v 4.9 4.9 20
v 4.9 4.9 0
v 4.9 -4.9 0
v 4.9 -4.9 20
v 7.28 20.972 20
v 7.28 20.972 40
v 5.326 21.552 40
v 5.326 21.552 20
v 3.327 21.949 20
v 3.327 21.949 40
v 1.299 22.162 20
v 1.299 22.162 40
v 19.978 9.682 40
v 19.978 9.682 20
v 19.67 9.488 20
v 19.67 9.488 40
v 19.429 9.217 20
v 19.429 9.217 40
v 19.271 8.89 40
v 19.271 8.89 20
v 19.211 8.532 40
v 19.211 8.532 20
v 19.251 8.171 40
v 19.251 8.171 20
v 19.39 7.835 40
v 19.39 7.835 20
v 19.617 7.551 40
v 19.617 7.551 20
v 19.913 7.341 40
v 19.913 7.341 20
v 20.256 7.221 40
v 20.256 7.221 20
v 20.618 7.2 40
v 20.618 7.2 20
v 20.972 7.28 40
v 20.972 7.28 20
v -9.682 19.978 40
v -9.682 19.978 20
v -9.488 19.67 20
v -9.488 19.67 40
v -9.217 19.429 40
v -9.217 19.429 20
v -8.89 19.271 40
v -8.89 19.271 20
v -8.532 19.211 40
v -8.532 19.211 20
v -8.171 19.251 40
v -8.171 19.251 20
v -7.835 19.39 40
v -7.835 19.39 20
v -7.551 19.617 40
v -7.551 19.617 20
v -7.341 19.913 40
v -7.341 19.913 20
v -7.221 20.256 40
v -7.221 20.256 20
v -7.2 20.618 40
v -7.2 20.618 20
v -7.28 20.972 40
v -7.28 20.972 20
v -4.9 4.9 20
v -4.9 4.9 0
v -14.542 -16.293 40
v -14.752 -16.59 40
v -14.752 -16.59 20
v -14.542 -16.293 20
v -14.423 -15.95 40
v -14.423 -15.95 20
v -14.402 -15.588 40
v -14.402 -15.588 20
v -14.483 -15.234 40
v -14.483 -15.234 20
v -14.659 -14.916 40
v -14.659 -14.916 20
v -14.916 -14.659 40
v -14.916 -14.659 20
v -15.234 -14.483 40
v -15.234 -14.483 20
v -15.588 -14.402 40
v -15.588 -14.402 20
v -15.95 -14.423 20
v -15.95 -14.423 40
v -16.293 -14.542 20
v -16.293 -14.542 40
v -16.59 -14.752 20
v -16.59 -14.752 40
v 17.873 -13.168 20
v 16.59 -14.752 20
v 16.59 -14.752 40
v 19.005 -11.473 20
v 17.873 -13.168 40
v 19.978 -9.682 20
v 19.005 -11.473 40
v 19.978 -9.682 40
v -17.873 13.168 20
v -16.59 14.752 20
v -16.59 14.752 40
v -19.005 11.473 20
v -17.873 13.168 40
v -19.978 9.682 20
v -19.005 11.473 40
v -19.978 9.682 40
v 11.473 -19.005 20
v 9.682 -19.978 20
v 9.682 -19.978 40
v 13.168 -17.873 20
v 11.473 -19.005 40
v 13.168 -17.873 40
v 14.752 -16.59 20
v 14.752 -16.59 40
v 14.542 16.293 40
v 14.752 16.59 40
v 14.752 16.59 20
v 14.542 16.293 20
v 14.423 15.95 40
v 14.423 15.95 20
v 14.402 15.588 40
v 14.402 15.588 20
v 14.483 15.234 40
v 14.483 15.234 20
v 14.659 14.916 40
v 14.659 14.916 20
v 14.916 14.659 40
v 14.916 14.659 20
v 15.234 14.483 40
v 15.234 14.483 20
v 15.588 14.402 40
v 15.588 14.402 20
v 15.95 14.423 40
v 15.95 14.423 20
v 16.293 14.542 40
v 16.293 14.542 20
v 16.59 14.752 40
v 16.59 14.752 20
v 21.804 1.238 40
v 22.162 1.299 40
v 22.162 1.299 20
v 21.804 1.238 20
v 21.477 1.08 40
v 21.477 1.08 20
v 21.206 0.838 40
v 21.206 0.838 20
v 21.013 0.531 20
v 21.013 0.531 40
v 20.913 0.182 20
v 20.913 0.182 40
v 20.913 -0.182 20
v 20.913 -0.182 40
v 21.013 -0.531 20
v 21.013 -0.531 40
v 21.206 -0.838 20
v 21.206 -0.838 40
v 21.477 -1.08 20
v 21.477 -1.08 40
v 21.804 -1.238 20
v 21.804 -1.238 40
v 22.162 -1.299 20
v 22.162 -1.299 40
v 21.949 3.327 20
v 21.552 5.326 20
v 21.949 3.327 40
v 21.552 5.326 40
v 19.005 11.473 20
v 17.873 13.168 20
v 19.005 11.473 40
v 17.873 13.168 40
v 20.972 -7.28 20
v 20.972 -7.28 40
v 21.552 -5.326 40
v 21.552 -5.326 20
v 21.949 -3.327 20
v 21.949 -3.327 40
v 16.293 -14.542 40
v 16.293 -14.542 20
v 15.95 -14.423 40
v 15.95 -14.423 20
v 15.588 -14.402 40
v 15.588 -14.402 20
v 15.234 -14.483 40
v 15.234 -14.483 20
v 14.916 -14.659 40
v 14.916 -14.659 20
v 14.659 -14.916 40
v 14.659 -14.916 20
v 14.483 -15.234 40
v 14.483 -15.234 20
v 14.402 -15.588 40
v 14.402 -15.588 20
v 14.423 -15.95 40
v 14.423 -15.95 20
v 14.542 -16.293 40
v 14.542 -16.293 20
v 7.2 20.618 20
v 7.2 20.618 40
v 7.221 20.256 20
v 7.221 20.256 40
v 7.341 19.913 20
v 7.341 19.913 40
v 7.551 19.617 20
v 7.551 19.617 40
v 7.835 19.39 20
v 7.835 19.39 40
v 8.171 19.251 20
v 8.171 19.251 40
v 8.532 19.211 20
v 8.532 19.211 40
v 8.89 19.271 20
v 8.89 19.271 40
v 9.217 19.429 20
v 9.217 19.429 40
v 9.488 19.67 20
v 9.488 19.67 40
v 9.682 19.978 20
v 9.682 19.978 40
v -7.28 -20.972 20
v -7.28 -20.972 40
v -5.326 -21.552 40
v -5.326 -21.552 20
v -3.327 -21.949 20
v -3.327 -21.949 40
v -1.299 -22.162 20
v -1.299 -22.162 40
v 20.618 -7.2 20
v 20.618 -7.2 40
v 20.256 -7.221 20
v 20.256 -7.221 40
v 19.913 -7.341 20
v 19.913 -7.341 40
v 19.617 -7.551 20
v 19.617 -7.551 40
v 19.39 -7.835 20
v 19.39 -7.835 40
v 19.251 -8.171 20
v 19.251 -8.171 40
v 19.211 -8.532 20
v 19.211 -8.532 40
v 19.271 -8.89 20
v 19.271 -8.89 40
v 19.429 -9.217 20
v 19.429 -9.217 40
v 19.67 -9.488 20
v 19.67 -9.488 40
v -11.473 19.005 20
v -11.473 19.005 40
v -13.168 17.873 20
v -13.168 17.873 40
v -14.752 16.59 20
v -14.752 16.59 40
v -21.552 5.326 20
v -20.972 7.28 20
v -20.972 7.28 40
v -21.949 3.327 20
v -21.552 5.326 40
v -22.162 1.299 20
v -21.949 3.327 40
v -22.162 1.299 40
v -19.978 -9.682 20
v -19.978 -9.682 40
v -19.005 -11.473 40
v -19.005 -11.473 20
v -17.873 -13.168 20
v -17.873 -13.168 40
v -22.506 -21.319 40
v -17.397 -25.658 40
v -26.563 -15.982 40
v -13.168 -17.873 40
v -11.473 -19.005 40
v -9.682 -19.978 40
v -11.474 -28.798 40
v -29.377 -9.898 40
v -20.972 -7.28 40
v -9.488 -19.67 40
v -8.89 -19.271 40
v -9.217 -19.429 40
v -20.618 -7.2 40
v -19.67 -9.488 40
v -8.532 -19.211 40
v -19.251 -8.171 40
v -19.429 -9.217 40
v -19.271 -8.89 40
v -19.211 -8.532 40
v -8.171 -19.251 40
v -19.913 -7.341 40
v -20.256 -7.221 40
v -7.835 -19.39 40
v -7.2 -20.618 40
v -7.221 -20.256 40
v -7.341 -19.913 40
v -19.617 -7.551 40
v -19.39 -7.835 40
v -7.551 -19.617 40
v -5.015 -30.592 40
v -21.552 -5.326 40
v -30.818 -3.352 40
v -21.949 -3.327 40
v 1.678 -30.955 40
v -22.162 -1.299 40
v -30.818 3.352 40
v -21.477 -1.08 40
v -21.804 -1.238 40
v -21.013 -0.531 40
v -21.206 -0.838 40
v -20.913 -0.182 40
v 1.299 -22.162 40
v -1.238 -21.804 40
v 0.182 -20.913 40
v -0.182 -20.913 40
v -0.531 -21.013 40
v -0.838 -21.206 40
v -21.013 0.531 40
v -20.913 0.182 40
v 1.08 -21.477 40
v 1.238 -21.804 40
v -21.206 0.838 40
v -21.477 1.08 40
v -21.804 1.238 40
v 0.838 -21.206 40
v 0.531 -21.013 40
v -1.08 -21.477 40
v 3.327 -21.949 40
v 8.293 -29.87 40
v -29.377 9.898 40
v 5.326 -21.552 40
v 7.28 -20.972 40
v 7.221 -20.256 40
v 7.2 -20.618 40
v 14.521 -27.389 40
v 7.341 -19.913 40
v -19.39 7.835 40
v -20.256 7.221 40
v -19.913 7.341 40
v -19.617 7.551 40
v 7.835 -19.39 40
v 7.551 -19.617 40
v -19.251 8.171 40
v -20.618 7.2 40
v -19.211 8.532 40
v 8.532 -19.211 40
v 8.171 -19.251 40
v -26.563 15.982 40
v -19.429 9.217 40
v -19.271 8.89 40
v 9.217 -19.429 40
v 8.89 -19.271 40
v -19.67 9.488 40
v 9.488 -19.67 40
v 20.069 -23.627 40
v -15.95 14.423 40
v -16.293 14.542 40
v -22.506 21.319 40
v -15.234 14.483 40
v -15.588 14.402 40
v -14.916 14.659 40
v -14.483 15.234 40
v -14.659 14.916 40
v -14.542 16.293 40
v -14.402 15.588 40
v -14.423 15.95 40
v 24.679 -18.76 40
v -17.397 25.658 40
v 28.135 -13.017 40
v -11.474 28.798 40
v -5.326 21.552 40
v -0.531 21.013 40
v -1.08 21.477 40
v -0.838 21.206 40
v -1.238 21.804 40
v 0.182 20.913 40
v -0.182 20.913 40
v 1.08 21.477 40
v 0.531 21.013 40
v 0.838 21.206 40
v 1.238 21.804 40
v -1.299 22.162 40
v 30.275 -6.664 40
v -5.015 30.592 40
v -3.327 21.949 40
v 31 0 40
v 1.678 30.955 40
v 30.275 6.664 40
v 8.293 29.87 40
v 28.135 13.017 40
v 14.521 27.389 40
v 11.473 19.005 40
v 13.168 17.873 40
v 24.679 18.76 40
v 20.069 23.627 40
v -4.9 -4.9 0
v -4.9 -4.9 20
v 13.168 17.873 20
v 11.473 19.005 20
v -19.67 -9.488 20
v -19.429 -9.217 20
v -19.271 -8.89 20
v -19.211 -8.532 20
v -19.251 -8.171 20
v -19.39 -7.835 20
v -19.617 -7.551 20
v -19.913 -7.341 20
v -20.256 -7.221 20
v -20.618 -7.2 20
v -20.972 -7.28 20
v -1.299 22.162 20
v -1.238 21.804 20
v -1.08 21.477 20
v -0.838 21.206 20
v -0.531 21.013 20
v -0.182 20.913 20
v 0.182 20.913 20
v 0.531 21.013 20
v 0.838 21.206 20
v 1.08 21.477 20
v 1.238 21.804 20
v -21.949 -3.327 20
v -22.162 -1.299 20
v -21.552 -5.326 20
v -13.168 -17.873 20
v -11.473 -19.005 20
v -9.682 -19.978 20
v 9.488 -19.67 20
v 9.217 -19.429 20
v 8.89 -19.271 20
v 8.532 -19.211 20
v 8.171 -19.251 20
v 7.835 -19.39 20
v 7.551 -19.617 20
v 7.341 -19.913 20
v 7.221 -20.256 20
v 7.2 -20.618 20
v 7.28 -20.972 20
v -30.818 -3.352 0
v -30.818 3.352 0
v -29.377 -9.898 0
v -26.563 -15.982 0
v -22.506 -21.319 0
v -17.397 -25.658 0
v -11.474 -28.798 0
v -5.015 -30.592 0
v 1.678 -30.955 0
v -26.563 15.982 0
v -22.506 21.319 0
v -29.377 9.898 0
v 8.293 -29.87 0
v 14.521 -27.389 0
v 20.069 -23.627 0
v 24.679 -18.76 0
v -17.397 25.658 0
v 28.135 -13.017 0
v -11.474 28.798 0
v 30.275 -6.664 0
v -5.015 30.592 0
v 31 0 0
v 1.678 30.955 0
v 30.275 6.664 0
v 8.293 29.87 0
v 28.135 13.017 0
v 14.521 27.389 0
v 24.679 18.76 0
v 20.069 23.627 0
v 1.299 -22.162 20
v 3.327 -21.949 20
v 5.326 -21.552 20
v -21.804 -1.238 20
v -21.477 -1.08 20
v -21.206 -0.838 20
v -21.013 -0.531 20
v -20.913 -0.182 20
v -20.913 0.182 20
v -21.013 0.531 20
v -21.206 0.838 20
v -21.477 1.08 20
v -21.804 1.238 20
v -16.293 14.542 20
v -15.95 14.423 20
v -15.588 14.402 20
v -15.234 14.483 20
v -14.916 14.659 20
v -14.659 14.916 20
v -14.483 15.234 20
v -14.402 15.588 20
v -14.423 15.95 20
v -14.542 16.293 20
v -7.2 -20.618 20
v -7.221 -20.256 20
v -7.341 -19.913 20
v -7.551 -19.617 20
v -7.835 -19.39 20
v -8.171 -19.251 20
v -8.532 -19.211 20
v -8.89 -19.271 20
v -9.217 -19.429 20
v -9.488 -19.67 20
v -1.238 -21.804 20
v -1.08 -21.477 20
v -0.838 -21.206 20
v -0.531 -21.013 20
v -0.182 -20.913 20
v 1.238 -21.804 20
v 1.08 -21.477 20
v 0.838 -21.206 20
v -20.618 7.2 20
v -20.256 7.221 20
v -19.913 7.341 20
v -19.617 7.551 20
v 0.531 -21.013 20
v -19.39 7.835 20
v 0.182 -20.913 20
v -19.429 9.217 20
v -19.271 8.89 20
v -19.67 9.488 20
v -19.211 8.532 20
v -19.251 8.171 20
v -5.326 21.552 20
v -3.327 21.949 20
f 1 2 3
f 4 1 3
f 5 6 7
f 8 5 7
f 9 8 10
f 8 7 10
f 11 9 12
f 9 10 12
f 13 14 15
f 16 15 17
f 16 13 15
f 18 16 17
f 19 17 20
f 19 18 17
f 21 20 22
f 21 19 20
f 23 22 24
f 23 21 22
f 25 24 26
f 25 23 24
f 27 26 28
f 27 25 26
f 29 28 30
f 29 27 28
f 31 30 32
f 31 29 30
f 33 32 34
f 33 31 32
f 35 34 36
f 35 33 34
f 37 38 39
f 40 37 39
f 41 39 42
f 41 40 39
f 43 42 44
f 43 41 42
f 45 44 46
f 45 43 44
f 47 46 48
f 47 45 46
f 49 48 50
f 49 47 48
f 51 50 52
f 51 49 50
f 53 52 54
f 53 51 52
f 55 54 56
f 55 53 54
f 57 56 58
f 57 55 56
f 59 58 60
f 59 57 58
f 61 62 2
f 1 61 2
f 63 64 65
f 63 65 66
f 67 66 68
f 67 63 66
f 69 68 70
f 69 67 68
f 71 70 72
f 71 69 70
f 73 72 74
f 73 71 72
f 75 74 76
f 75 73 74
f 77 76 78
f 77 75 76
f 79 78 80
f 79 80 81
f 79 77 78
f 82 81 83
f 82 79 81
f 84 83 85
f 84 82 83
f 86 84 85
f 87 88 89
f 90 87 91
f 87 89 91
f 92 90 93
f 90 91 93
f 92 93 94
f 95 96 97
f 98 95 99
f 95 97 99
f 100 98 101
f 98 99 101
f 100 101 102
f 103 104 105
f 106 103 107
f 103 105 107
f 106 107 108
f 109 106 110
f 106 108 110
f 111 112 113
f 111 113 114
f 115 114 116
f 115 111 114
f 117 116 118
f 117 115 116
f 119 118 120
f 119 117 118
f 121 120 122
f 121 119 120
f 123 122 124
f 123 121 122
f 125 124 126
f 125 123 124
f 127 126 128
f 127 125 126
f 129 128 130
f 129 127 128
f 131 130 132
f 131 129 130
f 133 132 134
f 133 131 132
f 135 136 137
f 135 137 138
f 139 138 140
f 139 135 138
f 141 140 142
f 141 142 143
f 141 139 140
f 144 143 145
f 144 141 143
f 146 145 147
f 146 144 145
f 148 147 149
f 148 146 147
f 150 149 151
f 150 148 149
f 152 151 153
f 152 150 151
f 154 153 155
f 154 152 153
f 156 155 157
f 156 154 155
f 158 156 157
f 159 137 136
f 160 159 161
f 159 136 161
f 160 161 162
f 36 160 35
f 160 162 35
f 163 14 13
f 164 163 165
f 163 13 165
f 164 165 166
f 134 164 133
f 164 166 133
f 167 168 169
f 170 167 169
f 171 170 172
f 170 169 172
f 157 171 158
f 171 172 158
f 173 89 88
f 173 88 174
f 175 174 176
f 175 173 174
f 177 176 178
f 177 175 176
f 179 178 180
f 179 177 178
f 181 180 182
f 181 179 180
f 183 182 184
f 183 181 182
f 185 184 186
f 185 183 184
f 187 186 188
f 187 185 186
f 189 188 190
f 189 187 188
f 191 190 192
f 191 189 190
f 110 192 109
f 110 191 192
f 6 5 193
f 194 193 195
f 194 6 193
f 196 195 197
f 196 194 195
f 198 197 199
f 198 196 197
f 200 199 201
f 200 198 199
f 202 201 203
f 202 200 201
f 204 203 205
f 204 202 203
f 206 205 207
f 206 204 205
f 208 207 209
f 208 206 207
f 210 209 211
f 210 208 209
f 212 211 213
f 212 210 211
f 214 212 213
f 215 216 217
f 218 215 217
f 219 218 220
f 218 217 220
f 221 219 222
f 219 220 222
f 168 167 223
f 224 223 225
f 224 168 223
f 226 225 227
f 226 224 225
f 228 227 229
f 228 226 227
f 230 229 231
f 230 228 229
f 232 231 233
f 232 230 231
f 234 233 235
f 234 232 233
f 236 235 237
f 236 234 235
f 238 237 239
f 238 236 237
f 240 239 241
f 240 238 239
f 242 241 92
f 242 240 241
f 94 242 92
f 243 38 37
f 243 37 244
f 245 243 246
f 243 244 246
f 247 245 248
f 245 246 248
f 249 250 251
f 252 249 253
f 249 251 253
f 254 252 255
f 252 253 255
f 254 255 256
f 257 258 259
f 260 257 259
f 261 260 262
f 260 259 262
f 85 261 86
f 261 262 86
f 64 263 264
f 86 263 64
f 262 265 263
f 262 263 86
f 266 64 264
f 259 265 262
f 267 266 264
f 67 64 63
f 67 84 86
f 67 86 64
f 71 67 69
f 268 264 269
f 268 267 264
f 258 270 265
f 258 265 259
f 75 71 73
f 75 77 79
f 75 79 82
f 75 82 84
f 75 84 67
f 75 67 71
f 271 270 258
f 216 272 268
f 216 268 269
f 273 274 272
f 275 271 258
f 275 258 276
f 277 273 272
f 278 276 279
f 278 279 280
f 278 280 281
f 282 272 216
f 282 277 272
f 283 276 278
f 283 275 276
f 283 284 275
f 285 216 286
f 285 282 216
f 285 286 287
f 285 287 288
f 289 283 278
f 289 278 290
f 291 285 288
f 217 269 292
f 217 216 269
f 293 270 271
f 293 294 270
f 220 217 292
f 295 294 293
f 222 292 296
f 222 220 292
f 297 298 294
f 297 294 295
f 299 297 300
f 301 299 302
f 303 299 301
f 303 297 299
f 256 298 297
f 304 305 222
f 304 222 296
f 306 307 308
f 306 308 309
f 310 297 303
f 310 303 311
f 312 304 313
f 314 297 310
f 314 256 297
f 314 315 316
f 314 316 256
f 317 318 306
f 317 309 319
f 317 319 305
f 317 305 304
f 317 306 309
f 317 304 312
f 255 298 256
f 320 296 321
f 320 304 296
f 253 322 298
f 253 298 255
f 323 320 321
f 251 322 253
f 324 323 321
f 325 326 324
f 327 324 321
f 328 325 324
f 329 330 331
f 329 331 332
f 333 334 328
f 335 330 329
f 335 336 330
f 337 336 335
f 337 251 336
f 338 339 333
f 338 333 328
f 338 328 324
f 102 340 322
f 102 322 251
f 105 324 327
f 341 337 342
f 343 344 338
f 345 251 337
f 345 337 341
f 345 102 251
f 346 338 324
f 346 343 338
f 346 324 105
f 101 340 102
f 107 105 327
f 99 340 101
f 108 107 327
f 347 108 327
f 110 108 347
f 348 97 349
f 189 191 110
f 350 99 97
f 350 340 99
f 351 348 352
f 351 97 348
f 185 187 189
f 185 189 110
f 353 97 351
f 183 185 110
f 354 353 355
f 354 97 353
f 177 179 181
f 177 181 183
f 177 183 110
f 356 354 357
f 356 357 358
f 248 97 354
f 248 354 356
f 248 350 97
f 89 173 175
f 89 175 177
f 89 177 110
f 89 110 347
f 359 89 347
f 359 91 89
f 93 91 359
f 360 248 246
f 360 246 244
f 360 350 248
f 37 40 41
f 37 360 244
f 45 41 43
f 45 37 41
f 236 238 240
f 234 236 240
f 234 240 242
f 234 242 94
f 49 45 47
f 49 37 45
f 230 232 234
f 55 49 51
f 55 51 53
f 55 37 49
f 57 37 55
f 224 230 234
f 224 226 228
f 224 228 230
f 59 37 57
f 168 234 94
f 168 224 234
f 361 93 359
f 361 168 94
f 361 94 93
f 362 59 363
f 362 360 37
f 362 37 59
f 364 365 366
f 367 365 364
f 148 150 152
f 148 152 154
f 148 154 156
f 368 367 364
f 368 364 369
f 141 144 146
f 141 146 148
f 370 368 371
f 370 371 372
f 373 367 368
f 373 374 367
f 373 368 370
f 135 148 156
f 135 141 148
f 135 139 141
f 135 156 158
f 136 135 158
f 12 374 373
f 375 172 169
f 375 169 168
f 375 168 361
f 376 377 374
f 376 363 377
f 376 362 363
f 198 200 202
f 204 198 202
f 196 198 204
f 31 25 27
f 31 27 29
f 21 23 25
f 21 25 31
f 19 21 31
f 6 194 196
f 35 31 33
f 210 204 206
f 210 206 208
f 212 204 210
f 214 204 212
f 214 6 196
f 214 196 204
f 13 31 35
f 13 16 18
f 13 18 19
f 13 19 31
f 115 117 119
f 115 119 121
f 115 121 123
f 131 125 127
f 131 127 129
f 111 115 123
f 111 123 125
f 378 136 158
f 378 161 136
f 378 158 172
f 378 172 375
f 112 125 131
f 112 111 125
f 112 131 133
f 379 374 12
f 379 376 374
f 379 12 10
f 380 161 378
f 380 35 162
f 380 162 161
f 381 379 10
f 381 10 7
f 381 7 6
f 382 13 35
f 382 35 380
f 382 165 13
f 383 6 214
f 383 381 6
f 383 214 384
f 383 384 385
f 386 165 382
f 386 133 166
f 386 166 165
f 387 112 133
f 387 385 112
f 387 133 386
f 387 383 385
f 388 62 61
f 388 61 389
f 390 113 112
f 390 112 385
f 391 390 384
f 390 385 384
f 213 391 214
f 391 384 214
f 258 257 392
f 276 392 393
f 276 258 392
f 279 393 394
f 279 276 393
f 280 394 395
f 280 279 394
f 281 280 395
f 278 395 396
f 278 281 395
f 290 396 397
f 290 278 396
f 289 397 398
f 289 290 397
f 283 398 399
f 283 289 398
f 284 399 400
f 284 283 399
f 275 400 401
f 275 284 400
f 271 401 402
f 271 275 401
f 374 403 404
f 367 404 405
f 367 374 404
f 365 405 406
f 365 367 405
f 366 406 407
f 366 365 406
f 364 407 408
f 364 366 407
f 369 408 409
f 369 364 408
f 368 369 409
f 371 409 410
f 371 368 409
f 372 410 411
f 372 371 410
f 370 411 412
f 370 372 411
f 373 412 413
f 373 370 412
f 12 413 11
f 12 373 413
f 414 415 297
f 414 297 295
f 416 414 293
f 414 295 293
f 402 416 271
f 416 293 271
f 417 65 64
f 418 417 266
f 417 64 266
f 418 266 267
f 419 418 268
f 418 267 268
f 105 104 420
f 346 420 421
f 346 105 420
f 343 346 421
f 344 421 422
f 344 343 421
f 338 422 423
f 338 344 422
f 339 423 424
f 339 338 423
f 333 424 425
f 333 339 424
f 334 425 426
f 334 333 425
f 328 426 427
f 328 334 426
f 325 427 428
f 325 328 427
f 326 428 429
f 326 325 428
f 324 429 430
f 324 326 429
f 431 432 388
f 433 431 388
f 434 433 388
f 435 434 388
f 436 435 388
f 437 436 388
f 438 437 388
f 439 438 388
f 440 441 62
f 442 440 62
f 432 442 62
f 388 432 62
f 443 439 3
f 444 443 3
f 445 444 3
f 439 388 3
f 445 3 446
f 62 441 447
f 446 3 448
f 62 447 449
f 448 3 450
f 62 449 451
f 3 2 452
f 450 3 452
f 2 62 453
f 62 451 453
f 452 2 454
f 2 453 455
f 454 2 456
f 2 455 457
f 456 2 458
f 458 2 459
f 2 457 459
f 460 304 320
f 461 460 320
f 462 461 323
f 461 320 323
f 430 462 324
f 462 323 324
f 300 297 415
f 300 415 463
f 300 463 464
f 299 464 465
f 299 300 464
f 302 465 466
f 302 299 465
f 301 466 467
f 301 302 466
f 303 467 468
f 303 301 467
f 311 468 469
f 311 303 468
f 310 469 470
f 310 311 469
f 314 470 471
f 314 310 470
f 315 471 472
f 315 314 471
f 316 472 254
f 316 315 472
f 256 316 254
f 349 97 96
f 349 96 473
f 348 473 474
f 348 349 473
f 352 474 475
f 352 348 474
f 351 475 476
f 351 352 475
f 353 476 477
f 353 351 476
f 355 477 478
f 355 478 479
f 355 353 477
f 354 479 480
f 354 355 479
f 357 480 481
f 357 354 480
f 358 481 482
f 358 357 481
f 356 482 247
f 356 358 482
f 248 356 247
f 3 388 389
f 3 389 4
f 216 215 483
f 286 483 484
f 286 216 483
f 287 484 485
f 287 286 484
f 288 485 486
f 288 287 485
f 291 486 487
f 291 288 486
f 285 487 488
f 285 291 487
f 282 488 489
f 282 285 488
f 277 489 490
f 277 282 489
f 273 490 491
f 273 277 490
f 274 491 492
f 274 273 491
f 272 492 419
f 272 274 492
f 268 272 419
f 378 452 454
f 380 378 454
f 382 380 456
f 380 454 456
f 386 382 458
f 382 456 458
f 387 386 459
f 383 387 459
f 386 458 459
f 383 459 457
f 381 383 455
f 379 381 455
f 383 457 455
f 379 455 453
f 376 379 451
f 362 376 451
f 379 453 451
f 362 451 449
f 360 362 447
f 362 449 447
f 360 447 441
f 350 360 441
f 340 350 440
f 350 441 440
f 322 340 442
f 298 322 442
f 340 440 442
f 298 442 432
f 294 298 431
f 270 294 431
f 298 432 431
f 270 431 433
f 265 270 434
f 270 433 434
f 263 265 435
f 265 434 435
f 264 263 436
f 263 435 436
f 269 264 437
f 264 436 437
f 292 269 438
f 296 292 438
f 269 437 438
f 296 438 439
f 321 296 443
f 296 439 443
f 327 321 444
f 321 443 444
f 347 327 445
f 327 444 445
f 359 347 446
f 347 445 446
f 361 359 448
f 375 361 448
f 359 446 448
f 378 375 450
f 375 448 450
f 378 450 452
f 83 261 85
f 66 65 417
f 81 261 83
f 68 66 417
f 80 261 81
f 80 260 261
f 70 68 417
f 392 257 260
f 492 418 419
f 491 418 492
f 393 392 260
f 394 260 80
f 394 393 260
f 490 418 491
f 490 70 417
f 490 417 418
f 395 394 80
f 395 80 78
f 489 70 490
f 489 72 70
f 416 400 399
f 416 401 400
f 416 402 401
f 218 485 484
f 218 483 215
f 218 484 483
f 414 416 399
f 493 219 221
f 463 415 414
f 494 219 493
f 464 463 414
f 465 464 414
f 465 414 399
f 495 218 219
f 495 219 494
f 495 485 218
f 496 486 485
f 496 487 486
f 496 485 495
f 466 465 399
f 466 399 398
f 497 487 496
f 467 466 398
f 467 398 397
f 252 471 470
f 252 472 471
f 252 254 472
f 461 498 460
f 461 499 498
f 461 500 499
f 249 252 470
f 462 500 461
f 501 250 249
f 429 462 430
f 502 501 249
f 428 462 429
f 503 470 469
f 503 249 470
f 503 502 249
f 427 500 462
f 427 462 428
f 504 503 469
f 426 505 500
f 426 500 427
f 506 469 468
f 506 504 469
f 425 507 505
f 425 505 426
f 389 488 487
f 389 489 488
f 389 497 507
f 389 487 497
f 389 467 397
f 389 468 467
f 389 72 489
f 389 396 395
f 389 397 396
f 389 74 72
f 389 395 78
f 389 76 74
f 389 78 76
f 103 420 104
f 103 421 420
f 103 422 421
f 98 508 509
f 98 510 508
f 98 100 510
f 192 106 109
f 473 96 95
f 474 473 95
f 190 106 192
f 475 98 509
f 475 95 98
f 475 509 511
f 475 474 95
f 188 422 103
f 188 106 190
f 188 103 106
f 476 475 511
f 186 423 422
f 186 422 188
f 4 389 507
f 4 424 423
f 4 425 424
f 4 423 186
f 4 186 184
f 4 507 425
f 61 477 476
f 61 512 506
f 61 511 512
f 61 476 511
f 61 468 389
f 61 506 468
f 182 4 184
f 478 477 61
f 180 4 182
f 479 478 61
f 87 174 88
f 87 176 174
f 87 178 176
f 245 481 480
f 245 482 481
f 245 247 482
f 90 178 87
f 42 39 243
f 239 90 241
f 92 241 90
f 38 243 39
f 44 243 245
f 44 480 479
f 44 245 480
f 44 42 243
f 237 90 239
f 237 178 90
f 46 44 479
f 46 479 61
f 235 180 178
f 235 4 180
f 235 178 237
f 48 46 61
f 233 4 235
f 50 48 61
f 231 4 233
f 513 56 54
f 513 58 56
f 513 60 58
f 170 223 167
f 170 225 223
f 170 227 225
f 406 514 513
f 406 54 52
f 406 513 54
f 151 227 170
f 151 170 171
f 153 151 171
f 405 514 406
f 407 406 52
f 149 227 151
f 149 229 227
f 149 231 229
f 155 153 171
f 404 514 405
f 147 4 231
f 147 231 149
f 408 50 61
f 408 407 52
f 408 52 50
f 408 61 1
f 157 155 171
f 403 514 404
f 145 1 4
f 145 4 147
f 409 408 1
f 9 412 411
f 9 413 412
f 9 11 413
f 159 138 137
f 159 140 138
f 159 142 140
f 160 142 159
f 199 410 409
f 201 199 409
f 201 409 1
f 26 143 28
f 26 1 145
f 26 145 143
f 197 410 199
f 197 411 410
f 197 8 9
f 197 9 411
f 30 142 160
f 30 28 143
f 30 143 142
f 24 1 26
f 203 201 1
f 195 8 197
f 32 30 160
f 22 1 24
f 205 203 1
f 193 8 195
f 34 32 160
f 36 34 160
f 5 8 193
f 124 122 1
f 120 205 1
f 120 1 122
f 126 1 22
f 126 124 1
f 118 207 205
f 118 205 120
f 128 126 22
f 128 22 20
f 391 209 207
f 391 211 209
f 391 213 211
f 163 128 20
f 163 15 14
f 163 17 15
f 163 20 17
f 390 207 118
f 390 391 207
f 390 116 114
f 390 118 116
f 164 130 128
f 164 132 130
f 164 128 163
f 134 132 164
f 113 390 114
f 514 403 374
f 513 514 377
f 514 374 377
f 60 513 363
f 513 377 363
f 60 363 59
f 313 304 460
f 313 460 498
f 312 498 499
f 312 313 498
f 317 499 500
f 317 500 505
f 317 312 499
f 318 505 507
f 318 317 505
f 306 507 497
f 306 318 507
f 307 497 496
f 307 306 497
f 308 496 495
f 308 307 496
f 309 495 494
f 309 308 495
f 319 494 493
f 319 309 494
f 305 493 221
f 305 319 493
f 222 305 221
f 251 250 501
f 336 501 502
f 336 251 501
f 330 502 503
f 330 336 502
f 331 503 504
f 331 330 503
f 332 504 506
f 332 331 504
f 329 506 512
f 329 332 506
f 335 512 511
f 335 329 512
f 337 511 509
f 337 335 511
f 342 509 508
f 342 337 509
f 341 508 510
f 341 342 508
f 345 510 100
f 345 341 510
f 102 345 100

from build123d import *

# Parameters (mm, degrees)
SKETCH_R           = 31
PAD_DEPTH          = 40
SKETCH001_R        = 22.2
POCKET_DEPTH       = 20
SKETCH002_R        = 1.3
PAD001_DEPTH       = 25
POLARPATTERN_COUNT = 16
SKETCH003_W        = 9.8
SKETCH003_H        = 9.8
POCKET001_DEPTH    = 40.001


with BuildPart() as part:
    # Sketch → Pad (new body)
    with BuildSketch(Plane.XY):
        Circle(SKETCH_R)
    extrude(amount=PAD_DEPTH)

    # Sketch001 → Pocket (cut)
    with BuildSketch(Plane.XY.offset(40)):
        Circle(SKETCH001_R)
    extrude(amount=-POCKET_DEPTH, mode=Mode.SUBTRACT)

    # Sketch002 → Pad001 (new body)
    with BuildSketch(Plane.XY.offset(40)):
        with Locations((0, 22.2)):
            Circle(SKETCH002_R)
    pad001 = extrude(amount=-PAD001_DEPTH)

    # PolarPattern: Pad001 ×16 about axis
    polarpattern_axis = Axis((0, 0, 40), (0, 0, 1))
    for i in range(1, POLARPATTERN_COUNT):
        add(pad001.rotate(polarpattern_axis, i * 360 / POLARPATTERN_COUNT))

    # Sketch003 → Pocket001 (cut, through all)
    with BuildSketch(Plane(origin=(0, 0, 0), x_dir=(1, 0, 0), z_dir=(0, 0, -1))):
        Rectangle(SKETCH003_W, SKETCH003_H)
    extrude(amount=-POCKET001_DEPTH, mode=Mode.SUBTRACT)


solid = part.part
